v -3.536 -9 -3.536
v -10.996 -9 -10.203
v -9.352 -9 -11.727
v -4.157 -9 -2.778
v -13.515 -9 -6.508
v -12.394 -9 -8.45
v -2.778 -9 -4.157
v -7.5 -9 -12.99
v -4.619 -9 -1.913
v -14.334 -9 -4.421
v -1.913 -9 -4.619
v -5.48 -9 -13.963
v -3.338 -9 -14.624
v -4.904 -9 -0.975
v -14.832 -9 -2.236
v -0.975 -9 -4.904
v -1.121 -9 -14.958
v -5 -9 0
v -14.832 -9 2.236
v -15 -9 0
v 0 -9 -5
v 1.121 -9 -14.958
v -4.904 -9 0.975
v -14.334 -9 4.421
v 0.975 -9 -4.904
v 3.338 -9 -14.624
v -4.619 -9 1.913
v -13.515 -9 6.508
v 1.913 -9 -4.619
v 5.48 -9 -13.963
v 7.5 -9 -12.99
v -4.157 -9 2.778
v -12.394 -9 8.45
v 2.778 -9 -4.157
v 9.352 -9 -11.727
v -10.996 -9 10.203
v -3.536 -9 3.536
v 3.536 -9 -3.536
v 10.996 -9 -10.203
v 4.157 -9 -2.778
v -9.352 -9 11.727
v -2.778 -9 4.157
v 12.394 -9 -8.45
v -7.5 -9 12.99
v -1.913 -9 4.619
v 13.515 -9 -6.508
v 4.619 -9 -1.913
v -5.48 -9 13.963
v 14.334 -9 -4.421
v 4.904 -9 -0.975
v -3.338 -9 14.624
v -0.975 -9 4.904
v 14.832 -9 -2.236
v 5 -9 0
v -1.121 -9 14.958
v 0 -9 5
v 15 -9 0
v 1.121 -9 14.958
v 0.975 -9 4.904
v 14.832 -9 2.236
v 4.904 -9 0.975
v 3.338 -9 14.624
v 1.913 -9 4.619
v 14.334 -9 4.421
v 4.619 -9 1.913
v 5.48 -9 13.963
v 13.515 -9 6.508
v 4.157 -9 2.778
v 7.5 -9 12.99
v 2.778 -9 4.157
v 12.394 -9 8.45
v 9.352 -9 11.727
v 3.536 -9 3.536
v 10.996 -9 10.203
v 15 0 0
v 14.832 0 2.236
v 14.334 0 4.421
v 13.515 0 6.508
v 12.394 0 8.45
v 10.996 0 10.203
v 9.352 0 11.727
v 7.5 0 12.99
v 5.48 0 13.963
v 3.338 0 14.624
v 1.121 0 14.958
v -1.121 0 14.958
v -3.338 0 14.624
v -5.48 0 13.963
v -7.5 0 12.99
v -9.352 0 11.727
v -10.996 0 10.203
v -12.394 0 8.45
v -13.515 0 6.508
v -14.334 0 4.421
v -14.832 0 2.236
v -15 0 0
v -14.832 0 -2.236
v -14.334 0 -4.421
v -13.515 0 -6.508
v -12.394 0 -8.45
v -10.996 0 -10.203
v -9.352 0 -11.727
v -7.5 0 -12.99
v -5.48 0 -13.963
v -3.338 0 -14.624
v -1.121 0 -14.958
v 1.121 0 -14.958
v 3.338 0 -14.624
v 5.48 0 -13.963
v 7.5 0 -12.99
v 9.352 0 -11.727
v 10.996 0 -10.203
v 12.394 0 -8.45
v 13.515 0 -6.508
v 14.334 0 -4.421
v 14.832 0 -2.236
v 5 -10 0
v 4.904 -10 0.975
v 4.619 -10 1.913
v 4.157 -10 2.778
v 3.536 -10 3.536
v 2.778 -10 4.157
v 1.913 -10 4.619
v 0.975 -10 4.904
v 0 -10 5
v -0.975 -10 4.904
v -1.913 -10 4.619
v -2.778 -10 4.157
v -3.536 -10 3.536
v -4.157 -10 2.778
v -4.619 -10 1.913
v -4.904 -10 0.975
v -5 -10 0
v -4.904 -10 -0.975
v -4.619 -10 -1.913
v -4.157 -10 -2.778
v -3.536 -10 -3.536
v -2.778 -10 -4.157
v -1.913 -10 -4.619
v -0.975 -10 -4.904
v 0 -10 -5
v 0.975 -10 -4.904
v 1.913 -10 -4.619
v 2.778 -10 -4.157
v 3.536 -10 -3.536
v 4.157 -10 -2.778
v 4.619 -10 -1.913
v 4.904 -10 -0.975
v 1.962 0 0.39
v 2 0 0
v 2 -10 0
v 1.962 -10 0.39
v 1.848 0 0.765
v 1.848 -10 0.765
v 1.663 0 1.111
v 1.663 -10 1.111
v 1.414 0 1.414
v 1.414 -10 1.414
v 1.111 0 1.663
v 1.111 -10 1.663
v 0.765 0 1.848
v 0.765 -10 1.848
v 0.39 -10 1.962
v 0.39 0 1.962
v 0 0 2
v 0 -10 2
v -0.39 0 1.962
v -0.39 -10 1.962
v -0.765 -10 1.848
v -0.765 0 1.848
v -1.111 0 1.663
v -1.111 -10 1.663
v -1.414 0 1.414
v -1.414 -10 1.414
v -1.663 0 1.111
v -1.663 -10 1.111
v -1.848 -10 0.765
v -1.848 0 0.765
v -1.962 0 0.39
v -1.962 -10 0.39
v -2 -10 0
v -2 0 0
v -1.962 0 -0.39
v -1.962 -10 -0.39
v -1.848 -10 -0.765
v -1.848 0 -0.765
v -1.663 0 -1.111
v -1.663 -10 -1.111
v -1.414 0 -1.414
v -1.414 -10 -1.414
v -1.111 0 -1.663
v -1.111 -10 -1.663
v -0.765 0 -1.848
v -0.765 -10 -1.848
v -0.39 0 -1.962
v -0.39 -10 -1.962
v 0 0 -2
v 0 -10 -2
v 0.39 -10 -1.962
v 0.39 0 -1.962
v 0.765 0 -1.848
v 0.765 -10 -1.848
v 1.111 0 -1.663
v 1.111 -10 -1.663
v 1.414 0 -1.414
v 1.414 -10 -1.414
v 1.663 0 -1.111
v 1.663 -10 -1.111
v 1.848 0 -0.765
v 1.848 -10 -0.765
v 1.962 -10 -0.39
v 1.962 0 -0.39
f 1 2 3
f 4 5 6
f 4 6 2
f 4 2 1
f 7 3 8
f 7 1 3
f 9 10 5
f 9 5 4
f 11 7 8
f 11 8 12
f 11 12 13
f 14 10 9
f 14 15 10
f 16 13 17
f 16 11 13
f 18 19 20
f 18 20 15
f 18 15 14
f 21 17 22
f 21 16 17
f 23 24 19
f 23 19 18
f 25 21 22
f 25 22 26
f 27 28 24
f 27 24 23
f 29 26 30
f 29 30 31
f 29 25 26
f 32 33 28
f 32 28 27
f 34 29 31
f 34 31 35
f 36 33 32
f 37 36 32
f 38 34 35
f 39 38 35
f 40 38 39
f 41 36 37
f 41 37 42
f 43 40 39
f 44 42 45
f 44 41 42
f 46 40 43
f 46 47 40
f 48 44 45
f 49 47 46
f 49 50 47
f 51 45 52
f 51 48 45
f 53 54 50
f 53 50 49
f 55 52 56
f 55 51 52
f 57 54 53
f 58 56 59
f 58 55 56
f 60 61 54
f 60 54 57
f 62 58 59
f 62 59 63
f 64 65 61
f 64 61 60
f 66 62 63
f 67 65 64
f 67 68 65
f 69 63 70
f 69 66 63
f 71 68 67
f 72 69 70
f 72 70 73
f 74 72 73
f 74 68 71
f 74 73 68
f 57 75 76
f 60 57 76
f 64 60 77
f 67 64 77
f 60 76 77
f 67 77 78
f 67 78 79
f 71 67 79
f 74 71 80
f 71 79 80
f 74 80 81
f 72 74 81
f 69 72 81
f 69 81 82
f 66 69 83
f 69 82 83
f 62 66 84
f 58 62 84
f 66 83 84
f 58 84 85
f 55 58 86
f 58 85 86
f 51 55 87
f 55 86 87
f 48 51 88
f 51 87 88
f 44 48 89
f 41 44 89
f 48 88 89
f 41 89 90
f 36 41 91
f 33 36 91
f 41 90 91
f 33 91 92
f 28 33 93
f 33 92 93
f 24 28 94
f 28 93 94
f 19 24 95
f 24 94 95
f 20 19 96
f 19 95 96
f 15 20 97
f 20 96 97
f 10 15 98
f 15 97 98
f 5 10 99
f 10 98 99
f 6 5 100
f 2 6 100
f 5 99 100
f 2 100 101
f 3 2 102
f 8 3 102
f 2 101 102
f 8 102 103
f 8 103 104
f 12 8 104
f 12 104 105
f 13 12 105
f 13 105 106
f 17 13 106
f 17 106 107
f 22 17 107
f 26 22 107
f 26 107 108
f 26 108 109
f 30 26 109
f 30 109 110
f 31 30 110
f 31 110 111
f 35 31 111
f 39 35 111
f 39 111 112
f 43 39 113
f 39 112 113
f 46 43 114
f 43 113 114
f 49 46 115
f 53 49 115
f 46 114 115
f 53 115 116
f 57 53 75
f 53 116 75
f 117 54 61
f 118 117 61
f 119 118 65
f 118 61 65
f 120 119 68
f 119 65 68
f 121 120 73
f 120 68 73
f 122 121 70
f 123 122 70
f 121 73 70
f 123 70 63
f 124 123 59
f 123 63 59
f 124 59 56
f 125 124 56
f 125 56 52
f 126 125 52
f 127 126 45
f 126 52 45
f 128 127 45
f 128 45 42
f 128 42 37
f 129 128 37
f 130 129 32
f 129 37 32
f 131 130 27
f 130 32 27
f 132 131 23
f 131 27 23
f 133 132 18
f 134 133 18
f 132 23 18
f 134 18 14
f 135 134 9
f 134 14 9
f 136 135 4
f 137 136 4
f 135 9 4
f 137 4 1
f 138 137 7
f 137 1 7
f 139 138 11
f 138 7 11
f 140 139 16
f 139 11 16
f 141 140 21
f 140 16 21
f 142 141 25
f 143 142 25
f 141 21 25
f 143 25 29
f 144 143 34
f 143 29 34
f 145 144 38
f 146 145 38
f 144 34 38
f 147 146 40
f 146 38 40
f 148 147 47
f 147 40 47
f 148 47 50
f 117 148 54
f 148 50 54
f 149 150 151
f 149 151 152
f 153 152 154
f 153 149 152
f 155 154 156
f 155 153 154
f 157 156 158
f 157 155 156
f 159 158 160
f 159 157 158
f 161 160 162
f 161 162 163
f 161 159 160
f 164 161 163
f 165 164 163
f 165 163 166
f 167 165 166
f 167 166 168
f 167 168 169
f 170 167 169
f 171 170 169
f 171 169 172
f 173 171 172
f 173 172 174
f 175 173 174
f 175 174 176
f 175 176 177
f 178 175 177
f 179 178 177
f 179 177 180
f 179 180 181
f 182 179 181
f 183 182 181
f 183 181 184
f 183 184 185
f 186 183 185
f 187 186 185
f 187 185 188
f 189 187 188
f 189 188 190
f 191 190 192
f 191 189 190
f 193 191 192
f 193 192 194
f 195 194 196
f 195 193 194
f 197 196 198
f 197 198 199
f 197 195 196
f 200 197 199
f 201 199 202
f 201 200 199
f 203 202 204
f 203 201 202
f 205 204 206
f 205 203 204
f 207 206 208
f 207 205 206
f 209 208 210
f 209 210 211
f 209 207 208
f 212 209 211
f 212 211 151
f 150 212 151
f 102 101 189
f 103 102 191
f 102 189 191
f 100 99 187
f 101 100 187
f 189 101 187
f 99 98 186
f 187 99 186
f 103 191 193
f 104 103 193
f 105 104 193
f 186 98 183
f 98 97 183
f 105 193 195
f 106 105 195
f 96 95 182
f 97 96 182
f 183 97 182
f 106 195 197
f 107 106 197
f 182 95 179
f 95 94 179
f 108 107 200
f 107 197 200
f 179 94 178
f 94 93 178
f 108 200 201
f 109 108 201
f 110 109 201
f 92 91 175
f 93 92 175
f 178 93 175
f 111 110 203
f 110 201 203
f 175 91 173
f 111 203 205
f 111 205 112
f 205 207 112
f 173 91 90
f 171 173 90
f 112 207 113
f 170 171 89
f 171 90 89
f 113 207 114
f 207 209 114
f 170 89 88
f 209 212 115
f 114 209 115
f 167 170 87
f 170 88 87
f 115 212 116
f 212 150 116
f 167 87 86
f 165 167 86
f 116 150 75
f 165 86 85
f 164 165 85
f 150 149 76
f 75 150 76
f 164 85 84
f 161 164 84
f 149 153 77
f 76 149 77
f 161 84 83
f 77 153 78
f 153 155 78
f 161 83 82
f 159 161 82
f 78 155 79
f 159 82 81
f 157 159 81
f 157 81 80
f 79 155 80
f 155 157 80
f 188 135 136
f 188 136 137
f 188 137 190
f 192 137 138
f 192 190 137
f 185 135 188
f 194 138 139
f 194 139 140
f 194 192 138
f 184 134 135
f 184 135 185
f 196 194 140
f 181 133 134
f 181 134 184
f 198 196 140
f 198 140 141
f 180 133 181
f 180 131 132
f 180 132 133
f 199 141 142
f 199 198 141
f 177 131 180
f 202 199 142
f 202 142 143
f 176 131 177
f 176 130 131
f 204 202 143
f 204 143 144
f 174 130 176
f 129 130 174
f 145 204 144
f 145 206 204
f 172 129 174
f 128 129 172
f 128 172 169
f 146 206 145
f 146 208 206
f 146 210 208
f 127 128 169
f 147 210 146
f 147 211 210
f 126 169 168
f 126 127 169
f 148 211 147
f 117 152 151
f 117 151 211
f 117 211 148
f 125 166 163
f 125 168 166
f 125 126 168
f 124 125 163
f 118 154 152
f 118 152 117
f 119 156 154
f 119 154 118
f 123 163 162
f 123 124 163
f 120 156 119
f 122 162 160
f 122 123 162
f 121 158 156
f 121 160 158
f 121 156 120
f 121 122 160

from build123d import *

# Parameters (mm, degrees)
SKETCH_R      = 15
SKETCH_R_2    = 2
PAD_DEPTH     = 9
SKETCH001_R   = 5
SKETCH001_R_2 = 2
PAD001_DEPTH  = 1


with BuildPart() as pad:
    # Sketch → Pad (new body)
    with BuildSketch(Plane.XZ):
        Circle(SKETCH_R)
        Circle(SKETCH_R_2, mode=Mode.SUBTRACT)
    extrude(amount=PAD_DEPTH)


with BuildPart() as fusion:
    # Pad001 base: copy of Pad
    add(pad.part)

    # Sketch001 → Pad001 (new body)
    with BuildSketch(Plane.XZ.offset(9)):
        Circle(SKETCH001_R)
        Circle(SKETCH001_R_2, mode=Mode.SUBTRACT)
    extrude(amount=PAD001_DEPTH)

    # Fusion: union Pad
    add(pad.part)


solid = fusion.part
